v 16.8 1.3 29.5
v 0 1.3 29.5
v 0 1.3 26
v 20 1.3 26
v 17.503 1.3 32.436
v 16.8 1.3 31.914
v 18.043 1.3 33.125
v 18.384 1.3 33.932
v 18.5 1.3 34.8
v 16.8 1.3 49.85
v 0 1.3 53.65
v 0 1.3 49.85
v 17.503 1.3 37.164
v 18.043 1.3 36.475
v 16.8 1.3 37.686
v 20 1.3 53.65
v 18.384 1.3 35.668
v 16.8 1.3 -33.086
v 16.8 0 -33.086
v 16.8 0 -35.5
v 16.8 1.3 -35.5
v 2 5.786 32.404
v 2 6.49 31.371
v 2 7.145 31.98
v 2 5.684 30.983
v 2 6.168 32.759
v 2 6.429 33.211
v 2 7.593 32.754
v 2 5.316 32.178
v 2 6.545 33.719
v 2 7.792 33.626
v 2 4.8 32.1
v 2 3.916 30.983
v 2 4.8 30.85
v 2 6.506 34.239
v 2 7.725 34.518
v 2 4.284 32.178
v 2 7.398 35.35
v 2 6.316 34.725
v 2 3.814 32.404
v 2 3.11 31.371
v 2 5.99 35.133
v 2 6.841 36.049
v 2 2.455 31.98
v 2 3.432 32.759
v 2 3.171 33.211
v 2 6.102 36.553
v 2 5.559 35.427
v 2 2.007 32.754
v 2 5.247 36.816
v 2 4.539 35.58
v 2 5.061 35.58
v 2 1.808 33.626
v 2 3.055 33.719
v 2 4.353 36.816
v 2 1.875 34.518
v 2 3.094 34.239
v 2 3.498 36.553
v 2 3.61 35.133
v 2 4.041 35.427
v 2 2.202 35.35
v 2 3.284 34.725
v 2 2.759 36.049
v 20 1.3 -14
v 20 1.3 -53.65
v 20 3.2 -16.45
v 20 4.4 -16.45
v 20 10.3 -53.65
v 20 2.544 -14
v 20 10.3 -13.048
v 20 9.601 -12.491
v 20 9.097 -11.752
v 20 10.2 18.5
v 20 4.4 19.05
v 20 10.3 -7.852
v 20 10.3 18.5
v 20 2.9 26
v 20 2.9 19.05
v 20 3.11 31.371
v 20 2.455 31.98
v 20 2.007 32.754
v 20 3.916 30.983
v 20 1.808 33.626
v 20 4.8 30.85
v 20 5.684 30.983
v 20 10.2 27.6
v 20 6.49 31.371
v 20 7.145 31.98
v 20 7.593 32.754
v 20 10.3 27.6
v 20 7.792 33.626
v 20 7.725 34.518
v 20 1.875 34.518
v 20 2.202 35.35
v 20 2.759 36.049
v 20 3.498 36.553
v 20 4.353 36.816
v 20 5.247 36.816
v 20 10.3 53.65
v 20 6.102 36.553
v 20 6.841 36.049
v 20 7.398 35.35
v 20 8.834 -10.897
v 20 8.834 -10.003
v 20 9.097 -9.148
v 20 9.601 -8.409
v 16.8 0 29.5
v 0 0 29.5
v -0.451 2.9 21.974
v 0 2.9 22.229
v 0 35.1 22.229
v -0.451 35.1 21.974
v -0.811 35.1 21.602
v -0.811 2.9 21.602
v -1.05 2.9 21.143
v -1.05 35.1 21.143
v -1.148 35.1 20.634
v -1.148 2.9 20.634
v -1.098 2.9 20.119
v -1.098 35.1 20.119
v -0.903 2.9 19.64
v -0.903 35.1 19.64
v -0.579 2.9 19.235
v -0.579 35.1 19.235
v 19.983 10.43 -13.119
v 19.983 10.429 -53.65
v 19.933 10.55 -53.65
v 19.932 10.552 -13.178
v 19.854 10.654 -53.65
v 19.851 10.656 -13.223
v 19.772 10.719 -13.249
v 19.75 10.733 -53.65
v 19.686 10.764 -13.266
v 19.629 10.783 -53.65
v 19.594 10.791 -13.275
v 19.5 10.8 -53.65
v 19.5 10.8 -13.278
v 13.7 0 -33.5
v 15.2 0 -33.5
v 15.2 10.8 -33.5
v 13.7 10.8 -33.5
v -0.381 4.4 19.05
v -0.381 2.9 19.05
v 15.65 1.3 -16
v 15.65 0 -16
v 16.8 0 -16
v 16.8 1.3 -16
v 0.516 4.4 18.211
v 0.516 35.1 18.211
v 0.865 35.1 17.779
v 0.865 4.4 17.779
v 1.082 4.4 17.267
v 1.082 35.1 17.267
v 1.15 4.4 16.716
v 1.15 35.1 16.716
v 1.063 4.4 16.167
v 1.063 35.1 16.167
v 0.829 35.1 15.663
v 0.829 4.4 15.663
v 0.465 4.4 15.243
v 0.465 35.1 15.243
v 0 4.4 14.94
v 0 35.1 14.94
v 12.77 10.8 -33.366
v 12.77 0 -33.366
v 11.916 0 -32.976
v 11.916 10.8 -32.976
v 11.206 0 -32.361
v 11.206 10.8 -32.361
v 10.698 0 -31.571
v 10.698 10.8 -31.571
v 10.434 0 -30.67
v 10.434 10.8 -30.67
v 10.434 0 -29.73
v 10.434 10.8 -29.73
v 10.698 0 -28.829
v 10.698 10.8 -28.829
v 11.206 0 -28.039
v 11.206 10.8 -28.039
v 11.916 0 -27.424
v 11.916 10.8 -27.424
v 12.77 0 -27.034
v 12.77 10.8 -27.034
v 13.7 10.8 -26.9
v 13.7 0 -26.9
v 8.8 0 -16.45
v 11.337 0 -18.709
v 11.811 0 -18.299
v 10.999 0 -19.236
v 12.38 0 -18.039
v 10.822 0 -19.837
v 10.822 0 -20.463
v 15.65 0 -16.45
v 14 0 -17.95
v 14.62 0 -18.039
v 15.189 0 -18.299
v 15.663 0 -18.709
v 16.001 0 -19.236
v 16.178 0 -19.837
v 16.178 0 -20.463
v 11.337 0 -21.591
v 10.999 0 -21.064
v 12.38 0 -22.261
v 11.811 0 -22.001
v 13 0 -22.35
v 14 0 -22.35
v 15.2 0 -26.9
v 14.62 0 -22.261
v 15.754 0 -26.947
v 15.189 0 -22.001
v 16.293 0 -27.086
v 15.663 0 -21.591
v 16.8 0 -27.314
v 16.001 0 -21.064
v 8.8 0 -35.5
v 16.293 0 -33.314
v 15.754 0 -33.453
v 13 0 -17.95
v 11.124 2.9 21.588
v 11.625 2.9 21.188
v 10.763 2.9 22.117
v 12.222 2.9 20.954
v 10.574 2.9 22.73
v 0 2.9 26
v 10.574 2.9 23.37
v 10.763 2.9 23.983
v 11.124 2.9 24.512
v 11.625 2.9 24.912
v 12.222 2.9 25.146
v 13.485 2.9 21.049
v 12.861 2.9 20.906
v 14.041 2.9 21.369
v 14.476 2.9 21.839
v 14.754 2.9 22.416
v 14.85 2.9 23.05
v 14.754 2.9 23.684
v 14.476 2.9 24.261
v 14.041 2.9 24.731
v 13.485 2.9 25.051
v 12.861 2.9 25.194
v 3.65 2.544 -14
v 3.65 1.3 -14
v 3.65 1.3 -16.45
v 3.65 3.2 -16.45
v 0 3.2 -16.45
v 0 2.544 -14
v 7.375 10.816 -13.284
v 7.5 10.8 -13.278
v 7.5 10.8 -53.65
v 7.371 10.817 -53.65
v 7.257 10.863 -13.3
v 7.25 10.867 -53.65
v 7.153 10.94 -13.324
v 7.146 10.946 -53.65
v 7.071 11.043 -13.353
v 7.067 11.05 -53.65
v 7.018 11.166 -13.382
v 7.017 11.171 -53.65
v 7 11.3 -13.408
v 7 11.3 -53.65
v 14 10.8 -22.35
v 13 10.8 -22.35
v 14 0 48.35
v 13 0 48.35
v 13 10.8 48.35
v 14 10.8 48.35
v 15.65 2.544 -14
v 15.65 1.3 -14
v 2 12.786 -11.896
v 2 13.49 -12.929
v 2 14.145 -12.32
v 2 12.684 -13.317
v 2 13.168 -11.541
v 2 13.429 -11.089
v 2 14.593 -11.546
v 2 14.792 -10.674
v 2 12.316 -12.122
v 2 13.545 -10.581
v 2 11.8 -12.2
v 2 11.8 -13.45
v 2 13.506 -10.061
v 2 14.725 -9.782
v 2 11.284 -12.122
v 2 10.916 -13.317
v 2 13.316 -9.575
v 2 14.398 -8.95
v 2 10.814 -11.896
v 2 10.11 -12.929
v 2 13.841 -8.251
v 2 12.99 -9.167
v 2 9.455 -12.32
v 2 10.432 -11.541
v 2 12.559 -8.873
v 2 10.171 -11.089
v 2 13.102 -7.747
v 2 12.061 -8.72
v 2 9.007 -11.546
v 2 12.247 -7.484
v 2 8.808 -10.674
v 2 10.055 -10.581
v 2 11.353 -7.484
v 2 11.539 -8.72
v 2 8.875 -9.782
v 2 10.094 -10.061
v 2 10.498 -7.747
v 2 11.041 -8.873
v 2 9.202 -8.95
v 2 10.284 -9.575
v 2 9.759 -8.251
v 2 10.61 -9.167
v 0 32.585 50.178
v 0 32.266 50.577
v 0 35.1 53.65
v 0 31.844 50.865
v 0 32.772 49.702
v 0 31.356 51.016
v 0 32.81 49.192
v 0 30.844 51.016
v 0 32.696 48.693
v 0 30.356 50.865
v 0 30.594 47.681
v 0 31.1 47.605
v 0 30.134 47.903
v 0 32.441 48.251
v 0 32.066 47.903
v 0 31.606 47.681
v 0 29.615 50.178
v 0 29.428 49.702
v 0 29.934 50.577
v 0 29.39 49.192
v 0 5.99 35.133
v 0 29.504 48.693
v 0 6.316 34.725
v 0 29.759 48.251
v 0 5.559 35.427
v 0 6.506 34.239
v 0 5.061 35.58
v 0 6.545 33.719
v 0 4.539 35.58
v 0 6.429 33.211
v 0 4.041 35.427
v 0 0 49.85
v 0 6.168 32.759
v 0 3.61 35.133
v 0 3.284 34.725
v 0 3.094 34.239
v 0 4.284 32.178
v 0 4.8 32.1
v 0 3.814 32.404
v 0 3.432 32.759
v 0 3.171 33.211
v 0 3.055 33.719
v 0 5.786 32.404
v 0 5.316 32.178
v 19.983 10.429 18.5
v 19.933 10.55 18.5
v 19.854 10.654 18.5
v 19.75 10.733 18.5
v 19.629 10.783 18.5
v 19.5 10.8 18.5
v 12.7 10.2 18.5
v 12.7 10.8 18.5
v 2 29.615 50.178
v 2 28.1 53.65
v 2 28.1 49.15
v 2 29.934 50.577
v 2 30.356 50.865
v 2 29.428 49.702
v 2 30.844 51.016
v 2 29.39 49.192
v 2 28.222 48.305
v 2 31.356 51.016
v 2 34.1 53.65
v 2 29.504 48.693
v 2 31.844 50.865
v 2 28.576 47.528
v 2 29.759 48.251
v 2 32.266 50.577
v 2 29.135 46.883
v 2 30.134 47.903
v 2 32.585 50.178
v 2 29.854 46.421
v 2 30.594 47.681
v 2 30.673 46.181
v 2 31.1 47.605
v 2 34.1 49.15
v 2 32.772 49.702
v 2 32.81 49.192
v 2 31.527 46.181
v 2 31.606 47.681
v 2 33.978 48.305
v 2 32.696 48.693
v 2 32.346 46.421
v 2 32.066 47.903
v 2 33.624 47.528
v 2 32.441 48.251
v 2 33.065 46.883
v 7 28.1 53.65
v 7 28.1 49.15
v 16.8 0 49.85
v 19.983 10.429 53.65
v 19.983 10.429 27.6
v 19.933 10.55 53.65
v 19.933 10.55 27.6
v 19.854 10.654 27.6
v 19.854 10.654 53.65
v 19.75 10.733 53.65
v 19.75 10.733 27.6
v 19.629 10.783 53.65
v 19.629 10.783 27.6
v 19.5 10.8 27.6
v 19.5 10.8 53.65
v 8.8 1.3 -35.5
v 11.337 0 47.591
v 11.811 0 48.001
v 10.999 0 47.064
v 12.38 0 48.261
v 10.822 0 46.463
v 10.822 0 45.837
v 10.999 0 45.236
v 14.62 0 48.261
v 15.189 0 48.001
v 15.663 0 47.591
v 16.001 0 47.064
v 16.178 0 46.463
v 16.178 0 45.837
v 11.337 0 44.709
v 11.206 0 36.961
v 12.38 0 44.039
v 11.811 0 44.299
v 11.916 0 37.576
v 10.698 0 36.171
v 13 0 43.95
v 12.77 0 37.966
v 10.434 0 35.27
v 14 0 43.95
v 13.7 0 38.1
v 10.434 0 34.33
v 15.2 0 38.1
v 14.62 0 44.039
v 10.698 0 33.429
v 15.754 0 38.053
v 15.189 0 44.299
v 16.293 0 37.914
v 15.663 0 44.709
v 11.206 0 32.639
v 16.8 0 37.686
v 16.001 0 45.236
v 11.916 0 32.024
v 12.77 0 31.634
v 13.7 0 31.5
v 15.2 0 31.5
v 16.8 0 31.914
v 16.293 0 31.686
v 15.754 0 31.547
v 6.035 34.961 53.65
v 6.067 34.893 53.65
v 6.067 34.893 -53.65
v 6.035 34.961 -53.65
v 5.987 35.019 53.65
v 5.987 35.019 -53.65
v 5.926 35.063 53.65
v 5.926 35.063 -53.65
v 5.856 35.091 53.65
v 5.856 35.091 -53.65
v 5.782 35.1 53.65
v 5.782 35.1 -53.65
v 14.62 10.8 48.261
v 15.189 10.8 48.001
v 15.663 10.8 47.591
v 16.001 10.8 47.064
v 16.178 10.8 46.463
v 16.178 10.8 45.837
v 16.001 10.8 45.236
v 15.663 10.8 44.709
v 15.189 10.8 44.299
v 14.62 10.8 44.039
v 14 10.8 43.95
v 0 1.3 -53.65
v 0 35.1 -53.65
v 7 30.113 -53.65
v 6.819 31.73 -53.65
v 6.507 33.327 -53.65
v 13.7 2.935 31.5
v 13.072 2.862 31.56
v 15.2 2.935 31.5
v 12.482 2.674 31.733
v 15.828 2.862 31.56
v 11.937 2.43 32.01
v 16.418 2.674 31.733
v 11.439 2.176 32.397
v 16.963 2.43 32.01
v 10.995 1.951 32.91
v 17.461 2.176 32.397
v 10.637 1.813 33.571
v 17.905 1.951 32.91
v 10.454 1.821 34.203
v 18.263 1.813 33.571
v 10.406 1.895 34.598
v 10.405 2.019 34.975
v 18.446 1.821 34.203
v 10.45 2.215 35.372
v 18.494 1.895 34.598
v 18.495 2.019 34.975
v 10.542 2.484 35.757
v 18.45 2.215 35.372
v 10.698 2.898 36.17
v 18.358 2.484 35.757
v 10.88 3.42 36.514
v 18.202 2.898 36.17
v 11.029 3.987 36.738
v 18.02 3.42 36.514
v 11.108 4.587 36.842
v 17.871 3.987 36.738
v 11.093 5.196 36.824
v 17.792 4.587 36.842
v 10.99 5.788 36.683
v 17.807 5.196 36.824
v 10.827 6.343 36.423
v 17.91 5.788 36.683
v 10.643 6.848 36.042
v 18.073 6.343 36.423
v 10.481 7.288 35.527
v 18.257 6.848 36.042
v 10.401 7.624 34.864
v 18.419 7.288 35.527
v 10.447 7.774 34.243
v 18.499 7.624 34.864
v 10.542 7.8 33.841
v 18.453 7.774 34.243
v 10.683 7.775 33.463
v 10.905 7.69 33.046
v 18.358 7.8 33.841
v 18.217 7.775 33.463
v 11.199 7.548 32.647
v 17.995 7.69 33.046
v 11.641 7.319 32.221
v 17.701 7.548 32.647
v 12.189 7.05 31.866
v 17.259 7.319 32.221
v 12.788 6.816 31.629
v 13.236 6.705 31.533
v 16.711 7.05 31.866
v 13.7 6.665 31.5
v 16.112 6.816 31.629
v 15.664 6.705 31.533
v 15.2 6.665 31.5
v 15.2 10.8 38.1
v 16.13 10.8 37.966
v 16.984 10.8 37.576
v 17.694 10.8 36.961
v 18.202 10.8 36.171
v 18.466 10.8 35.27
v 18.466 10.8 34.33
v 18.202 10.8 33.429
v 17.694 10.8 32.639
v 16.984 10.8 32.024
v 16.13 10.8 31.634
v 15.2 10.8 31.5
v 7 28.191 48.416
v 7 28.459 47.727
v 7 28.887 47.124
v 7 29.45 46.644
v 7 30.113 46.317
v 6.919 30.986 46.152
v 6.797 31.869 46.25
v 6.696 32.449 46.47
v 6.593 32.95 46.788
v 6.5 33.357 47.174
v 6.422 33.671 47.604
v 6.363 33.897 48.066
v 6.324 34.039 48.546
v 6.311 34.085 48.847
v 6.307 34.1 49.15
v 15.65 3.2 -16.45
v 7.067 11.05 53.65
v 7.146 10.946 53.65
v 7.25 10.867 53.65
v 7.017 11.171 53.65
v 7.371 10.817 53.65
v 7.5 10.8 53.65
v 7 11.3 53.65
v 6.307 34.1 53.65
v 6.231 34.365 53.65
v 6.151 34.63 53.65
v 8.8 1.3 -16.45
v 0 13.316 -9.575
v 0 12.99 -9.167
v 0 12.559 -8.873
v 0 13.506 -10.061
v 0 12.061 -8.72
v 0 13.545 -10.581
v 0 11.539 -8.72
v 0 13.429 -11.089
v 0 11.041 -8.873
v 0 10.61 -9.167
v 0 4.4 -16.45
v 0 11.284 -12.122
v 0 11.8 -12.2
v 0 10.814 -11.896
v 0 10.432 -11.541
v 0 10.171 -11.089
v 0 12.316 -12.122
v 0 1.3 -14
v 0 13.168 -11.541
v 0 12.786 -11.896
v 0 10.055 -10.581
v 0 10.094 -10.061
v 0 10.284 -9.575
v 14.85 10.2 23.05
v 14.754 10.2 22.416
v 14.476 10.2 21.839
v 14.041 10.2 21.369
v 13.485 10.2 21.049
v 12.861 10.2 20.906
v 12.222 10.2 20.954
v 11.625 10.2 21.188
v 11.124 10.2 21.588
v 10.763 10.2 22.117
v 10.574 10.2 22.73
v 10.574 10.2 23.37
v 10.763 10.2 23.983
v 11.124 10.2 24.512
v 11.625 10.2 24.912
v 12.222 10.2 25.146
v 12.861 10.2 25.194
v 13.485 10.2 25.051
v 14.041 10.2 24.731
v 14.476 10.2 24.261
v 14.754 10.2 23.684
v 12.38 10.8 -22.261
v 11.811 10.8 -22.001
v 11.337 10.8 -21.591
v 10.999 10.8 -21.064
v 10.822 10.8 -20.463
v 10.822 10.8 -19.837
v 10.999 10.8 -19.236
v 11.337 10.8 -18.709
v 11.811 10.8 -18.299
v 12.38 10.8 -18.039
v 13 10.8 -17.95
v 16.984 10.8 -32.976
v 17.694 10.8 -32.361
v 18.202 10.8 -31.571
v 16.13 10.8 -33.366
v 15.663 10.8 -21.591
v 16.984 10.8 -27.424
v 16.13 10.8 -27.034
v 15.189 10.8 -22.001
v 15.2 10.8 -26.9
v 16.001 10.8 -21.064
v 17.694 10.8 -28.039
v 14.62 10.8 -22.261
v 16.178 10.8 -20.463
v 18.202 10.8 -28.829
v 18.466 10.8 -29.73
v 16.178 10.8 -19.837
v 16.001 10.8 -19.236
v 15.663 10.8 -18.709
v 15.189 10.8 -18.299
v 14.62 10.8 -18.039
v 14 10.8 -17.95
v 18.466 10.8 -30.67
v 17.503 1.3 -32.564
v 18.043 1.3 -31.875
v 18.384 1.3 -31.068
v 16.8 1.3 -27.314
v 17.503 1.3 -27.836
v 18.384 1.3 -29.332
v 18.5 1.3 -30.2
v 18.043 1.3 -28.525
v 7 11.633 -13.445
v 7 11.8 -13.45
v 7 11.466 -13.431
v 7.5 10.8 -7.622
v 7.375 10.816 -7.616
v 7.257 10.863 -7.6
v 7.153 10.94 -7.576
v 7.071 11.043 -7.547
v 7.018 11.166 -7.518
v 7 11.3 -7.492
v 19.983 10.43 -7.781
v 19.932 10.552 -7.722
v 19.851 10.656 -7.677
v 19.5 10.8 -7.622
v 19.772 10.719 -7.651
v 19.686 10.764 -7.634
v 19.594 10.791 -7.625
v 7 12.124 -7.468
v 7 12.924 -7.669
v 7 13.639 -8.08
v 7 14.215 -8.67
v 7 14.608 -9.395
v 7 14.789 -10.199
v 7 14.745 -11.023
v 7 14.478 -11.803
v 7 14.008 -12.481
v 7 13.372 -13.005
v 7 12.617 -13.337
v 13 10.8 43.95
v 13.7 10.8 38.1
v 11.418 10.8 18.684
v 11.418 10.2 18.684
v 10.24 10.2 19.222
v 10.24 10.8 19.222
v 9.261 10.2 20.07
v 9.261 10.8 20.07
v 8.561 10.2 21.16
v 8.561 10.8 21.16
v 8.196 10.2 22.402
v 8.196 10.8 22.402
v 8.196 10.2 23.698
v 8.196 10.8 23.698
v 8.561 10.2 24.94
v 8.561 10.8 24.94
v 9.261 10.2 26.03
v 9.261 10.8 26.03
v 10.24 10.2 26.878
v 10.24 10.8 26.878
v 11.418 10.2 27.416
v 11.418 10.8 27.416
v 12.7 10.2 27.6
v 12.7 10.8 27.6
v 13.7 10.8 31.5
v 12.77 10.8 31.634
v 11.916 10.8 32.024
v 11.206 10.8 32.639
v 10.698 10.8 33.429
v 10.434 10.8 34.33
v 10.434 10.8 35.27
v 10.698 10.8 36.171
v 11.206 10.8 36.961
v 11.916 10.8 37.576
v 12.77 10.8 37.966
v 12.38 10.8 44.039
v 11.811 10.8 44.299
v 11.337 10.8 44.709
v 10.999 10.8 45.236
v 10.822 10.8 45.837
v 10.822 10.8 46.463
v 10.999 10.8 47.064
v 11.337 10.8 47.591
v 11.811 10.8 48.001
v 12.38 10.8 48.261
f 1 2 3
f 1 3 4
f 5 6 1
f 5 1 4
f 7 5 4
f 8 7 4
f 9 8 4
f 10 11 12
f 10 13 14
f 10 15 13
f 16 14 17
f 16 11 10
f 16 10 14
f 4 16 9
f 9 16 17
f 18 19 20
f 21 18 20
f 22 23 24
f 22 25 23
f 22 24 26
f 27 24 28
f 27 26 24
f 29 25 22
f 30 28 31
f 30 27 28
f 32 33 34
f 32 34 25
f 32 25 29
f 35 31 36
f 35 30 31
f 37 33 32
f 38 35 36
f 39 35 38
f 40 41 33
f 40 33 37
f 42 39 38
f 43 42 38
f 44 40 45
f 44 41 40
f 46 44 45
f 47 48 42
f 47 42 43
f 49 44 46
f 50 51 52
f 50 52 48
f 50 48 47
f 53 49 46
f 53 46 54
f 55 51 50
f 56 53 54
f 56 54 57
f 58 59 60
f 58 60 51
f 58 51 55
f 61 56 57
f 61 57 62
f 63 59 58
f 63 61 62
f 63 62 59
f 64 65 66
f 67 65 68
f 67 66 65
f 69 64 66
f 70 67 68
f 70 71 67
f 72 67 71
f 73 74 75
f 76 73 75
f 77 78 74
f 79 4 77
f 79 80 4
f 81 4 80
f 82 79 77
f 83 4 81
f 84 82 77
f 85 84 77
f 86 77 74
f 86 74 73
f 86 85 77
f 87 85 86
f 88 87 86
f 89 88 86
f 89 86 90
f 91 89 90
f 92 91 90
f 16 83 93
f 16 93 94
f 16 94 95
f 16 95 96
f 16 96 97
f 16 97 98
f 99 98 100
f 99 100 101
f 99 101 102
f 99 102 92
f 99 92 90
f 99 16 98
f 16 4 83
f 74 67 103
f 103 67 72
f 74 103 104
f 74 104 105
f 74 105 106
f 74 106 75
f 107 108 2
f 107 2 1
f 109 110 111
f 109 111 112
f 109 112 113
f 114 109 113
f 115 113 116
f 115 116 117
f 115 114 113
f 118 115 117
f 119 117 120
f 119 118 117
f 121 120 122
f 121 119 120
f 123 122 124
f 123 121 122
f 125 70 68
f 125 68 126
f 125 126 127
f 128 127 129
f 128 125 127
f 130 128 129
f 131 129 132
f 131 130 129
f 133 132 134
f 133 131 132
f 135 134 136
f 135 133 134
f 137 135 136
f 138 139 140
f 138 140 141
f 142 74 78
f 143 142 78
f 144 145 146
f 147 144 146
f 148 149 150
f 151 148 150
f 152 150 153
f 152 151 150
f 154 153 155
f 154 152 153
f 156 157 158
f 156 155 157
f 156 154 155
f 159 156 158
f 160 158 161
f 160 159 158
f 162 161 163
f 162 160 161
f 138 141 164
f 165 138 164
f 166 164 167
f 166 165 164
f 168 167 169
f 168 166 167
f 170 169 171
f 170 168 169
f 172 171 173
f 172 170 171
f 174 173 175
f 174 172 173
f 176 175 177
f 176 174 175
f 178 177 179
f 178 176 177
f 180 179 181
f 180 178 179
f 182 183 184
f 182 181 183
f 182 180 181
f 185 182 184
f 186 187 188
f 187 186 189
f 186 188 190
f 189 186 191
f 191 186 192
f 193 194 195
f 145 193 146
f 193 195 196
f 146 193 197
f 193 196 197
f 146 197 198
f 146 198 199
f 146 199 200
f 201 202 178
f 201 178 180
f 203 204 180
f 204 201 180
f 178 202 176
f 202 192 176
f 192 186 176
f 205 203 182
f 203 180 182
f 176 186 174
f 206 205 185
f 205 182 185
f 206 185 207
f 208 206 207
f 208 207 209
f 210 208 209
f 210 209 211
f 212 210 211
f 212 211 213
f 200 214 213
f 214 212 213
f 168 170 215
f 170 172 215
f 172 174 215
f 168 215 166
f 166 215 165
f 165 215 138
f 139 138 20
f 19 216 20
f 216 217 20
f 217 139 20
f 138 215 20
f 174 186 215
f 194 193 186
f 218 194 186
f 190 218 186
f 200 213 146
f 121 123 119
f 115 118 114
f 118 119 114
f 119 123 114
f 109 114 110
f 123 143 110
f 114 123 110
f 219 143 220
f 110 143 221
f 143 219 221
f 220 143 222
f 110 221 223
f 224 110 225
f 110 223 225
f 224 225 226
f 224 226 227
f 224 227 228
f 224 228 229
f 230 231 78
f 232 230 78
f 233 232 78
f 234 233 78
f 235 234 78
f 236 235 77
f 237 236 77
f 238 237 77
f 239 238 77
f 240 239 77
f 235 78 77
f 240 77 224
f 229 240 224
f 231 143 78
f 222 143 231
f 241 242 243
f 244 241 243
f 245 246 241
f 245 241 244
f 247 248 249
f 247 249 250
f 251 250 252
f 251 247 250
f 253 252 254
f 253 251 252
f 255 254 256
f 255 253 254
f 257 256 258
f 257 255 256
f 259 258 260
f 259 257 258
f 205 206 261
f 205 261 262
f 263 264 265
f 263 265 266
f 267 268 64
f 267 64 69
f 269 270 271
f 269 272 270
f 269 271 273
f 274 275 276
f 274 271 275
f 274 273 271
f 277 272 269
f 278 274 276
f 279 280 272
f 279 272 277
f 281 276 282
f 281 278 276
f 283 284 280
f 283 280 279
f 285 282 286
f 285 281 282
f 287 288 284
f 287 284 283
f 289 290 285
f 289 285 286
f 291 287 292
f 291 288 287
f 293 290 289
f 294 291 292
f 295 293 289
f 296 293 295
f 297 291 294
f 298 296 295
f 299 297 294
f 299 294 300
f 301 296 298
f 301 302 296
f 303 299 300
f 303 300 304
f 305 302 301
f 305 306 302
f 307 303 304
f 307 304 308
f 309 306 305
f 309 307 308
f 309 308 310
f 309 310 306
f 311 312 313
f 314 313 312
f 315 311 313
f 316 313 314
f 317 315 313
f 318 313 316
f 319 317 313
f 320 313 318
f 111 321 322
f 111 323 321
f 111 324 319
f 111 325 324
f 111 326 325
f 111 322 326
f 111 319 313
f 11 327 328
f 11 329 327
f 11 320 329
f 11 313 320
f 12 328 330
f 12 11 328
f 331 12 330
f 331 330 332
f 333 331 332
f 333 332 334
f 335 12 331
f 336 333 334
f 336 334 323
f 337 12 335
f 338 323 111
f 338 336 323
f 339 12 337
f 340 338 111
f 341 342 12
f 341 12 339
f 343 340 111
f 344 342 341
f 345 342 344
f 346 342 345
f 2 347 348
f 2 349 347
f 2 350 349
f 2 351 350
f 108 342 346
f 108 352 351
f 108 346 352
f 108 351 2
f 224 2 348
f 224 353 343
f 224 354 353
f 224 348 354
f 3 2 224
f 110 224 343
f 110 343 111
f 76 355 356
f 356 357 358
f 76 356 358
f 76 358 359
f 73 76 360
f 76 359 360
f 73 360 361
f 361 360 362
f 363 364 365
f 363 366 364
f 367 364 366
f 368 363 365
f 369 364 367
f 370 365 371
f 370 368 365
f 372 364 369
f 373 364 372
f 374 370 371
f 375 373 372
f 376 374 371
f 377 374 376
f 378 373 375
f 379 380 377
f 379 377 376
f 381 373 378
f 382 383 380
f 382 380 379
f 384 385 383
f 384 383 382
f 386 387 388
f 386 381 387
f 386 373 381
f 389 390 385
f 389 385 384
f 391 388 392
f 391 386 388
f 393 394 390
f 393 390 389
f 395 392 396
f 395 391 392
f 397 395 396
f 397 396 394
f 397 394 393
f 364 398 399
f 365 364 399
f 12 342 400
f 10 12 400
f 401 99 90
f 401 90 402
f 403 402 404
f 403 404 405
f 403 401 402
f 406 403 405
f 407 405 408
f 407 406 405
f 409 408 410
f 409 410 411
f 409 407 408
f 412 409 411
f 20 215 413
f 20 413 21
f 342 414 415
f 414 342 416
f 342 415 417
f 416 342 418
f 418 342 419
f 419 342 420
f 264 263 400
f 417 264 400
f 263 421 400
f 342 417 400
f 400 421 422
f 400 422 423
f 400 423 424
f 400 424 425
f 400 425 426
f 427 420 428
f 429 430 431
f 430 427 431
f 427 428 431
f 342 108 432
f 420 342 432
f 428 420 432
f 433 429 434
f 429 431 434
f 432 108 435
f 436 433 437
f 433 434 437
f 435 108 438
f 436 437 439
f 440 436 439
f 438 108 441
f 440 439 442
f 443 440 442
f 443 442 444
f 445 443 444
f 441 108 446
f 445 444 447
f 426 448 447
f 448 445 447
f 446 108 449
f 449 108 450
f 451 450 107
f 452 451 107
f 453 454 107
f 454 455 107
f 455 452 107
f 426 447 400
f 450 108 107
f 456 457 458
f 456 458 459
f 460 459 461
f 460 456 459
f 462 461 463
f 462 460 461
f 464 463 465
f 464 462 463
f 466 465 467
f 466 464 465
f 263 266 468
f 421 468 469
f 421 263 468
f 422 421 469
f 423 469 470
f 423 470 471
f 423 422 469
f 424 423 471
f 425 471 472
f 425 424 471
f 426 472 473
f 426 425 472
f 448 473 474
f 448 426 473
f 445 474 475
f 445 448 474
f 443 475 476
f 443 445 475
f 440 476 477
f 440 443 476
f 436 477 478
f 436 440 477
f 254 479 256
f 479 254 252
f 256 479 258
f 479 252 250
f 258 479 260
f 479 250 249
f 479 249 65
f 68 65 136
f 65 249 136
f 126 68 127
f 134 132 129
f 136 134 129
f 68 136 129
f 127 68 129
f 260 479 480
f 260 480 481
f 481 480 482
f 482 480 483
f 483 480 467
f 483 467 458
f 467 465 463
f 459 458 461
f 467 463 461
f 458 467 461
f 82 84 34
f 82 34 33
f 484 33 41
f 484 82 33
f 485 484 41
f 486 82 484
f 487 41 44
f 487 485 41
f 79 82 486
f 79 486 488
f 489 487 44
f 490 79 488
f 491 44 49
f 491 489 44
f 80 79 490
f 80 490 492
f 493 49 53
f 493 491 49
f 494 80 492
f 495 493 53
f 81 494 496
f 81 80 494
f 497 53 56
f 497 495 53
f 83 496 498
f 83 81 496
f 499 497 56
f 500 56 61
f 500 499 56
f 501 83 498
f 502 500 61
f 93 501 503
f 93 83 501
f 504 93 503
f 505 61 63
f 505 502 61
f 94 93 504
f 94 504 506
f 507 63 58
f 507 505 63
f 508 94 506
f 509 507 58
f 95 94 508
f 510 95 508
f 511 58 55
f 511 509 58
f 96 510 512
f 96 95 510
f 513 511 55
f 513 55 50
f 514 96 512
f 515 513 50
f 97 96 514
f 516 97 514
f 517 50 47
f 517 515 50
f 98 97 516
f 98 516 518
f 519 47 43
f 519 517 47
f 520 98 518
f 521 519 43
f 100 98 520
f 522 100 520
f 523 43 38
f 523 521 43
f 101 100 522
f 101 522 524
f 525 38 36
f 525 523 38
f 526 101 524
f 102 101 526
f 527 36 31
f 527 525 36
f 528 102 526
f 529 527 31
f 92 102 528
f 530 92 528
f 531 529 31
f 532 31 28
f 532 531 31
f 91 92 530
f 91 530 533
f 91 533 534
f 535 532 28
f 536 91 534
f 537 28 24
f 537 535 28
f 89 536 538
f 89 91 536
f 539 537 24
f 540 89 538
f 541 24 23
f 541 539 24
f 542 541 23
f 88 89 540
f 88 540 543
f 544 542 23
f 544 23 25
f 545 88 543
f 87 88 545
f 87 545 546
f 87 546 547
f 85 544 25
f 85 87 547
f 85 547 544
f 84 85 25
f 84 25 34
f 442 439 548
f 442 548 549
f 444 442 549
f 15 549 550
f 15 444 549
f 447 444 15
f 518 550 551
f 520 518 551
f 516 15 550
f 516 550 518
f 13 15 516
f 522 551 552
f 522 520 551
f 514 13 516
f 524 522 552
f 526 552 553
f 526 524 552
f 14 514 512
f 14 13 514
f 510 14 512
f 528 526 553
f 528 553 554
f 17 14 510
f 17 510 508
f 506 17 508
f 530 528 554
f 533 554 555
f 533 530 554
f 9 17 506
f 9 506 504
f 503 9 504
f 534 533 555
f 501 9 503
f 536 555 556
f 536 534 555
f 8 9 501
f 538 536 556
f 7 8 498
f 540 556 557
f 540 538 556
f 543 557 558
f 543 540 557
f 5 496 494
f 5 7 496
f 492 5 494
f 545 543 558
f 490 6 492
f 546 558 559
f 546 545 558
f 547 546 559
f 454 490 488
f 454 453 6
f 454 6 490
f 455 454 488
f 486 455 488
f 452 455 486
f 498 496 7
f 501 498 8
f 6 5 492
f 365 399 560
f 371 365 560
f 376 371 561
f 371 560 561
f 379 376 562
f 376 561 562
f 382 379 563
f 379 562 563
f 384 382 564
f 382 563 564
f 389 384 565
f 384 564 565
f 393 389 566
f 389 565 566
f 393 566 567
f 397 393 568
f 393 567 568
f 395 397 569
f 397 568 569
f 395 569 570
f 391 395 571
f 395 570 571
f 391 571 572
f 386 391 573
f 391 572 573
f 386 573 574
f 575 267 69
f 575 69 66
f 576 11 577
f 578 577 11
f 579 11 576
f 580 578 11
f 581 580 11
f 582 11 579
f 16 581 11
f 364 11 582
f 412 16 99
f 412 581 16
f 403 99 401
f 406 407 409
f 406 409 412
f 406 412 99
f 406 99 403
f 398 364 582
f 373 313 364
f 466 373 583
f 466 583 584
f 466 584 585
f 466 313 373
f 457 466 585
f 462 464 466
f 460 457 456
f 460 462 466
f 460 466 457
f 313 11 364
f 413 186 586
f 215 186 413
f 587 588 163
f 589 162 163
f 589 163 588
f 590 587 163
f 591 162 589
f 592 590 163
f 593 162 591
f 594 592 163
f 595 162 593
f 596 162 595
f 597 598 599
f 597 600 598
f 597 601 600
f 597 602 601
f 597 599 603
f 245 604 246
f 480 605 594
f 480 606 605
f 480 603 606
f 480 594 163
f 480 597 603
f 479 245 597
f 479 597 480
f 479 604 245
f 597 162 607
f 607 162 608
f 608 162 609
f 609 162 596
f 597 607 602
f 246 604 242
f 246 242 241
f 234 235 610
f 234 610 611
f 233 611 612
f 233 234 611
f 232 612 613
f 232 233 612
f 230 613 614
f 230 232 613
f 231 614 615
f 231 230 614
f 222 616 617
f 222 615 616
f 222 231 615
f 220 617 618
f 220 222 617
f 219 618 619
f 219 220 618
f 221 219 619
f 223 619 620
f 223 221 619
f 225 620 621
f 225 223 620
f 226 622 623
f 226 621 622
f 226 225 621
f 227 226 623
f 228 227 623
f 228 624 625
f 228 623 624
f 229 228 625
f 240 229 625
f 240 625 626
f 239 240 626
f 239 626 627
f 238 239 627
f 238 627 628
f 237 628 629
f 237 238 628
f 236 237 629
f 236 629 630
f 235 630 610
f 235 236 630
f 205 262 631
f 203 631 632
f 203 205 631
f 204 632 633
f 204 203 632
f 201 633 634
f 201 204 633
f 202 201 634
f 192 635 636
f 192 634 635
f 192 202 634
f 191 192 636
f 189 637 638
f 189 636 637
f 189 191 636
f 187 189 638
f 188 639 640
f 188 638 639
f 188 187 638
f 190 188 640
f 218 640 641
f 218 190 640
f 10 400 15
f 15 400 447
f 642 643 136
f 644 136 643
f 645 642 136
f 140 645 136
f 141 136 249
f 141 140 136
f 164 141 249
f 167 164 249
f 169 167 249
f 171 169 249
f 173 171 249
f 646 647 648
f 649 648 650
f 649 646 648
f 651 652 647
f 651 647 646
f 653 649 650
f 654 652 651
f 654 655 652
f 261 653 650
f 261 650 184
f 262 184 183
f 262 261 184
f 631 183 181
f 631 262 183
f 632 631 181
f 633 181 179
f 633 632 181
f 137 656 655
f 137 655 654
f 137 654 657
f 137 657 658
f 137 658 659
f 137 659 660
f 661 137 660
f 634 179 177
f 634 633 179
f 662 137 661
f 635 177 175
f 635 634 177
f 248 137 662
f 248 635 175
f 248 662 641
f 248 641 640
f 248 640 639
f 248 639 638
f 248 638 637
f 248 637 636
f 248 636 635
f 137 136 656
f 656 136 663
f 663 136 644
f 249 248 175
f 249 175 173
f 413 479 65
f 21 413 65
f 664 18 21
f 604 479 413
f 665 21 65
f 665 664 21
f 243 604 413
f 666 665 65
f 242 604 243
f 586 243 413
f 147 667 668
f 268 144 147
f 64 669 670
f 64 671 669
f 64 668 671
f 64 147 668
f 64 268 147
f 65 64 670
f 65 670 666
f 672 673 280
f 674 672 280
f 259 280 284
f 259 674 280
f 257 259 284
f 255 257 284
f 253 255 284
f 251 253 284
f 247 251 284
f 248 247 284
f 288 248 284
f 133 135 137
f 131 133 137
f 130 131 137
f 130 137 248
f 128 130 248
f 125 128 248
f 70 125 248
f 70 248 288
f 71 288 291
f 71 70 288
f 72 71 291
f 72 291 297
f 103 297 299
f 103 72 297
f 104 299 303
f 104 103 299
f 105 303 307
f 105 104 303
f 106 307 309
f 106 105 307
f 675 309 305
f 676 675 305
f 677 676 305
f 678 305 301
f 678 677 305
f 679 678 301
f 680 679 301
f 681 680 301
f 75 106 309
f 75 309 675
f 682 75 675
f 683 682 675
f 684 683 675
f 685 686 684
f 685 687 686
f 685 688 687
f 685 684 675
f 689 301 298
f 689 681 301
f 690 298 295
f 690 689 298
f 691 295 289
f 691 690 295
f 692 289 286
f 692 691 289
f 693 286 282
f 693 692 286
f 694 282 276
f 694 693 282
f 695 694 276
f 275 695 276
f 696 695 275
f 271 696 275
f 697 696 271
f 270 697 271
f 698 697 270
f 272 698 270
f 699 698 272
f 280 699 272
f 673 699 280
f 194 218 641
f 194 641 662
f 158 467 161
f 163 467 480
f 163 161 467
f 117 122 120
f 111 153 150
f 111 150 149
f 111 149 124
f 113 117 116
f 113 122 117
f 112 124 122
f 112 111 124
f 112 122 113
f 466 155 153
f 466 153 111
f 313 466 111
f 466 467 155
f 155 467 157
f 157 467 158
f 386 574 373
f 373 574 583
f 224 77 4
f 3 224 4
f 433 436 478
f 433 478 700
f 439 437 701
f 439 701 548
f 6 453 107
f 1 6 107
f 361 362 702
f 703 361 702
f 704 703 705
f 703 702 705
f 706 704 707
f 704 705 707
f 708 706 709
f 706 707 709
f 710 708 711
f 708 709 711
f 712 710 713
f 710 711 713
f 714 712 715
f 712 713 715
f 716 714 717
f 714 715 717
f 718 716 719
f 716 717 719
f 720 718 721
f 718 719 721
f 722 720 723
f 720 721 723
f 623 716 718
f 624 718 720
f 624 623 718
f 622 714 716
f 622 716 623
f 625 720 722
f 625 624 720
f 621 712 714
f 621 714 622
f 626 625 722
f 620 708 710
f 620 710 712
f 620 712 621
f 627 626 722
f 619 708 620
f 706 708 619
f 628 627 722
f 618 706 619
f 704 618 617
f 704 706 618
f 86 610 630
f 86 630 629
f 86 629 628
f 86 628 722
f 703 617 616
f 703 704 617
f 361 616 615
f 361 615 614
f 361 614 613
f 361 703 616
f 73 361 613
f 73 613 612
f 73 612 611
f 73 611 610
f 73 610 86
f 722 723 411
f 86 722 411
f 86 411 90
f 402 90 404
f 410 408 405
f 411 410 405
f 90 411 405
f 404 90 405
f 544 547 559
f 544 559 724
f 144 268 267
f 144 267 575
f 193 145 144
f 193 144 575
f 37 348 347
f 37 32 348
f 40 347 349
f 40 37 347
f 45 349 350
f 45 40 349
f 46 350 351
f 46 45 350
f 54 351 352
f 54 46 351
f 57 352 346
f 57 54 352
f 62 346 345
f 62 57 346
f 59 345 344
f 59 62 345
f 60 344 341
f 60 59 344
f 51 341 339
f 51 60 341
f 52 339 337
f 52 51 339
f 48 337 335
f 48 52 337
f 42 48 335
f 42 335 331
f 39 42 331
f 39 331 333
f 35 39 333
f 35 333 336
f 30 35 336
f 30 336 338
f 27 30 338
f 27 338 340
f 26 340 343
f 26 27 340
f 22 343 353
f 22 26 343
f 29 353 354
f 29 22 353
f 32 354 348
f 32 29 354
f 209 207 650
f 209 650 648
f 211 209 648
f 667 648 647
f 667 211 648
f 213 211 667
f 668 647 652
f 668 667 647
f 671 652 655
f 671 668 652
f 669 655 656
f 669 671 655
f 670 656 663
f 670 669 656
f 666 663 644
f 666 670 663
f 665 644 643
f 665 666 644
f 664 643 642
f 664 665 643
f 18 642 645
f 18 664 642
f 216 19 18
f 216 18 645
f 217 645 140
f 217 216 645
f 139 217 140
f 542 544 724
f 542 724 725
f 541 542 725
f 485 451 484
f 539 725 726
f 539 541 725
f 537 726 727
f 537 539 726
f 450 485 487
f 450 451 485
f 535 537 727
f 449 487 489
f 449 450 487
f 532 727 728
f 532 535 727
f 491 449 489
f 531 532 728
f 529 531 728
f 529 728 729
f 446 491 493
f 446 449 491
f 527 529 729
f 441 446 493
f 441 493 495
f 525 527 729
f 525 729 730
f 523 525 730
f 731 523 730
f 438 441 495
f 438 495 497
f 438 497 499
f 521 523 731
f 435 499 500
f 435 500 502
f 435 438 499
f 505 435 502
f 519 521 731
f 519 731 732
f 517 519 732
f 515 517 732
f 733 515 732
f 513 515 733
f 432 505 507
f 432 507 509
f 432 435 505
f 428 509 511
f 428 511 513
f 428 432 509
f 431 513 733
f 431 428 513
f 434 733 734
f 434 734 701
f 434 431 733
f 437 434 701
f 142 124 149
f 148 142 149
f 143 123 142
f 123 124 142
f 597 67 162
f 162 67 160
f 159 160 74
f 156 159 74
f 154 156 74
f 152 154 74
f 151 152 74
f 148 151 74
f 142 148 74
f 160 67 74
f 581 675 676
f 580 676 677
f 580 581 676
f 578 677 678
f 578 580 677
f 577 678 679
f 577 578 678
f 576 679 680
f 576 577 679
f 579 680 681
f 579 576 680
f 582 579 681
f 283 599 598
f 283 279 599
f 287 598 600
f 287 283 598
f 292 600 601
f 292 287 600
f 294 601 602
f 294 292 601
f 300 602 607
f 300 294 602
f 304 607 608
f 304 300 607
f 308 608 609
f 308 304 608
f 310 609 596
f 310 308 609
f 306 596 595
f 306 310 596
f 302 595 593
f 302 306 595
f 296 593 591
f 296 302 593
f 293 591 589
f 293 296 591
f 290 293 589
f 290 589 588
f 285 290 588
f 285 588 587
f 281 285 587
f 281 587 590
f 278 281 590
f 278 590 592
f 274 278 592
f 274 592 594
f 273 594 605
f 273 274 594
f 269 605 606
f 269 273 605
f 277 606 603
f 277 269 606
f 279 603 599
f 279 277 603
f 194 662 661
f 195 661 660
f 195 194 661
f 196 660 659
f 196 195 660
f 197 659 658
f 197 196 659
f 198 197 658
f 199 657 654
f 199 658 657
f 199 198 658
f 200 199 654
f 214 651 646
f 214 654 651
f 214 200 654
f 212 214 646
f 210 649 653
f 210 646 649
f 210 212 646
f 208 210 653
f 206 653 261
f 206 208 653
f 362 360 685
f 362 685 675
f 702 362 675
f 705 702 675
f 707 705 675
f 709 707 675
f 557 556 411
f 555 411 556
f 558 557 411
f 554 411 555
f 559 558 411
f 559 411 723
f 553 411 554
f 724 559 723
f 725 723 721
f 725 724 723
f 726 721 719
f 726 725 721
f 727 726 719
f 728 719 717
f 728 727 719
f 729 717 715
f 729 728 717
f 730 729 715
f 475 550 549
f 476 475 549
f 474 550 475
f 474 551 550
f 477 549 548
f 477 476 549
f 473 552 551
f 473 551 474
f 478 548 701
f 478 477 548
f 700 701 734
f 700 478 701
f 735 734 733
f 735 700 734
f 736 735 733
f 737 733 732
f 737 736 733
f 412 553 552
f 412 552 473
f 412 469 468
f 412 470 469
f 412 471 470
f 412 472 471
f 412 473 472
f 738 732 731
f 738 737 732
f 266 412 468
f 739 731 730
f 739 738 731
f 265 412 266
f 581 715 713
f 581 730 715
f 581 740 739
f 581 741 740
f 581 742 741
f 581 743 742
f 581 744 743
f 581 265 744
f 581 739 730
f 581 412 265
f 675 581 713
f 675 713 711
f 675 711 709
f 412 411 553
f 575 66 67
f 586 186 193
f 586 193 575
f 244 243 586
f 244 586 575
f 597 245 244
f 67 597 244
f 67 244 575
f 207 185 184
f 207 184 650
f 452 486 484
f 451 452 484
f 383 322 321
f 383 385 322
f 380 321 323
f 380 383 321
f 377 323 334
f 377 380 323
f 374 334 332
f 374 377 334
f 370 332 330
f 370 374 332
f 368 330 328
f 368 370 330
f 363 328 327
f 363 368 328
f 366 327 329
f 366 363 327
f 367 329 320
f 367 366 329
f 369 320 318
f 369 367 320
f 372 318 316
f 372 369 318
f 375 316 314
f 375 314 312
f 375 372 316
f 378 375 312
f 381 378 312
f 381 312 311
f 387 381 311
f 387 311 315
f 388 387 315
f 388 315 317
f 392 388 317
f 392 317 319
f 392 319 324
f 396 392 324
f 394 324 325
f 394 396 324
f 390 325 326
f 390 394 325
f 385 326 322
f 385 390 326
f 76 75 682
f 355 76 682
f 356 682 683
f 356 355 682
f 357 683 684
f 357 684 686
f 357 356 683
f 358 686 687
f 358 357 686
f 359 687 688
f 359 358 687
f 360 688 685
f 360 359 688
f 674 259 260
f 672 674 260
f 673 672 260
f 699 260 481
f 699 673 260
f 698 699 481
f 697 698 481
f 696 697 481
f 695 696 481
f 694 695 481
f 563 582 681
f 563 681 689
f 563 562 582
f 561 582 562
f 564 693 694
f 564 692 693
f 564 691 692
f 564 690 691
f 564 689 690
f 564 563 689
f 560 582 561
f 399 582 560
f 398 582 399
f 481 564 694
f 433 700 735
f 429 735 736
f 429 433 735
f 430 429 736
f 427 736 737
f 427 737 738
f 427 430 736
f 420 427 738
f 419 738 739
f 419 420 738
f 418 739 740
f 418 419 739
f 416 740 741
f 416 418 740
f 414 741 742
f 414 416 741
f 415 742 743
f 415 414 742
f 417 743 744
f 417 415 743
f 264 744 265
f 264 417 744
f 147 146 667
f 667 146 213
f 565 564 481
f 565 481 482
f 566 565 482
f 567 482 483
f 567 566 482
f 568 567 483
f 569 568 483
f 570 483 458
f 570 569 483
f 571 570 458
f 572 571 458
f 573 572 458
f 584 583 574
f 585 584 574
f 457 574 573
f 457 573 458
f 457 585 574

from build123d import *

# Parameters (mm, degrees)
BOSS_EXTRUDE1_DEPTH      = 53.65
BOSS_EXTRUDE1_DEPTH_BACK = 53.65
CUT_EXTRUDE1_DEPTH       = 50
CUT_EXTRUDE2_DEPTH       = 40
CUT_EXTRUDE2_DEPTH_BACK  = 40
SKETCH4_W                = 8
SKETCH4_H                = 19.5
BOSS_EXTRUDE2_DEPTH      = 1.5
SKETCH5_W                = 16.8
SKETCH5_H                = 20.35
BOSS_EXTRUDE3_DEPTH      = 1.5
CUT_EXTRUDE3_DEPTH       = 30
CUT_EXTRUDE3_DEPTH_BACK  = 30
CUT_EXTRUDE4_DEPTH       = 30
SKETCH8_R                = 2.15
CUT_EXTRUDE5_DEPTH       = 30
CUT_EXTRUDE6_DEPTH       = 10.8
CUT_EXTRUDE7_DEPTH       = 10.8
SKETCH13_W               = 20
SKETCH13_H               = 1.715
CUT_EXTRUDE8_DEPTH       = 5
CUT_EXTRUDE8_DEPTH_BACK  = 5
CUT_EXTRUDE9_DEPTH       = 0.6
SKETCH16_W               = 12
SKETCH16_H               = 2.5
CUT_EXTRUDE10_DEPTH      = 3.5


with BuildPart() as part:
    # Sketch1 → Boss-Extrude1 (new body, two sides)
    with BuildSketch(Plane.XY) as boss_extrude1_sk:
        with BuildLine():
            Line((-5, 1.3), (20, 1.3))
            Line((20, 1.3), (20, 10.3))
            ThreePointArc((20, 10.3), (19.853553391, 10.653553391), (19.5, 10.8))
            Line((19.5, 10.8), (7.5, 10.8))
            ThreePointArc((7.5, 10.8), (7.146446609, 10.946446609), (7, 11.3))
            Line((7, 11.3), (7, 30.113329403))
            ThreePointArc((7, 30.113329403), (6.679537553, 32.531612644), (6.067046966, 34.89289308))
            ThreePointArc((6.067046966, 34.89289308), (5.958046762, 35.042763181), (5.781791158, 35.1))
            Line((5.781791158, 35.1), (-5, 35.1))
            Line((-5, 35.1), (-5, 1.3))
        make_face()
    extrude(amount=BOSS_EXTRUDE1_DEPTH)
    extrude(boss_extrude1_sk.sketch, amount=-BOSS_EXTRUDE1_DEPTH_BACK)

    # Sketch2 → Cut-Extrude1 (cut)
    with BuildSketch(Plane(origin=(0, 0, 0), x_dir=(1, 0, 0), z_dir=(0, 1, 0))):
        with BuildLine():
            Line((-50, 53.65), (-50, -53.65))
            Line((-50, -53.65), (0, -53.65))
            Line((0, -53.65), (0, -22.228541033))
            ThreePointArc((0, -22.228541033), (-1.117187677, -20.892122365), (-0.57947873, -19.235320551))
            Line((-0.57947873, -19.235320551), (0.516087478, -18.210754943))
            ThreePointArc((0.516087478, -18.210754943), (1.125563929, -16.438315605), (0, -14.939613301))
            Line((0, -14.939613301), (0, 53.65))
            Line((0, 53.65), (-50, 53.65))
        make_face()
    extrude(amount=CUT_EXTRUDE1_DEPTH, mode=Mode.SUBTRACT)

    # Sketch3 → Cut-Extrude2 (cut, two sides)
    with BuildSketch(Plane(origin=(0, 0, 0), x_dir=(0, 0, -1), z_dir=(1, 0, 0))) as cut_extrude2_sk:
        Polygon((-26, 2.9), (-26, -8.174443219), (14, -7.963716906), (14, 2.543524479), (16.45, 3.2), (16.45, 4.4), (-19.05, 4.4), (-19.05, 2.9), align=None)
    extrude(amount=CUT_EXTRUDE2_DEPTH, mode=Mode.SUBTRACT)
    extrude(cut_extrude2_sk.sketch, amount=-CUT_EXTRUDE2_DEPTH_BACK, mode=Mode.SUBTRACT)

    # Sketch4 → Boss-Extrude2 (add)
    with BuildSketch(Plane(origin=(0, 0, 0), x_dir=(1, 0, 0), z_dir=(0, 1, 0))):
        with Locations((12.8, 25.75)):
            Rectangle(SKETCH4_W, SKETCH4_H)
    extrude(amount=BOSS_EXTRUDE2_DEPTH)

    # Sketch5 → Boss-Extrude3 (add)
    with BuildSketch(Plane(origin=(0, 0, 0), x_dir=(1, 0, 0), z_dir=(0, 1, 0))):
        with Locations((8.4, -39.675)):
            Rectangle(SKETCH5_W, SKETCH5_H)
    extrude(amount=BOSS_EXTRUDE3_DEPTH)

    # Sketch6 → Cut-Extrude3 (cut, two sides)
    with BuildSketch(Plane(origin=(0, 0, 0), x_dir=(1, 0, 0), z_dir=(0, 1, 0))) as cut_extrude3_sk:
        with BuildLine():
            Line((13.7, 26.9), (15.2, 26.9))
            ThreePointArc((15.2, 26.9), (18.5, 30.2), (15.2, 33.5))
            Line((15.2, 33.5), (13.7, 33.5))
            ThreePointArc((13.7, 33.5), (10.4, 30.2), (13.7, 26.9))
        make_face()
    extrude(amount=CUT_EXTRUDE3_DEPTH, mode=Mode.SUBTRACT)
    extrude(cut_extrude3_sk.sketch, amount=-CUT_EXTRUDE3_DEPTH_BACK, mode=Mode.SUBTRACT)

    # Sketch7 → Cut-Extrude4 (cut)
    with BuildSketch(Plane(origin=(0, 0, 0), x_dir=(1, 0, 0), z_dir=(0, 1, 0))):
        with BuildLine():
            Line((13, 17.95), (14, 17.95))
            ThreePointArc((14, 17.95), (16.2, 20.15), (14, 22.35))
            Line((14, 22.35), (13, 22.35))
            ThreePointArc((13, 22.35), (10.8, 20.15), (13, 17.95))
        make_face()
    extrude(amount=CUT_EXTRUDE4_DEPTH, mode=Mode.SUBTRACT)

    # Sketch8 → Cut-Extrude5 (cut)
    with BuildSketch(Plane(origin=(0, 0, 0), x_dir=(1, 0, 0), z_dir=(0, 1, 0))):
        with Locations((12.7, -23.05)):
            Circle(SKETCH8_R)
    extrude(amount=CUT_EXTRUDE5_DEPTH, mode=Mode.SUBTRACT)

    # Sketch9 → Cut-Extrude6 (cut)
    with BuildSketch(Plane(origin=(0, 0, 0), x_dir=(1, 0, 0), z_dir=(0, 1, 0))):
        with BuildLine():
            Line((13.7, -38.1), (15.2, -38.1))
            ThreePointArc((15.2, -38.1), (18.5, -34.8), (15.2, -31.5))
            Line((15.2, -31.5), (13.7, -31.5))
            ThreePointArc((13.7, -31.5), (10.4, -34.8), (13.7, -38.1))
        make_face()
    extrude(amount=CUT_EXTRUDE6_DEPTH, mode=Mode.SUBTRACT)

    # Sketch10 → Cut-Extrude7 (cut)
    with BuildSketch(Plane(origin=(0, 0, 0), x_dir=(1, 0, 0), z_dir=(0, 1, 0))):
        with BuildLine():
            Line((13, -48.35), (14, -48.35))
            ThreePointArc((14, -48.35), (16.2, -46.15), (14, -43.95))
            Line((14, -43.95), (13, -43.95))
            ThreePointArc((13, -43.95), (10.8, -46.15), (13, -48.35))
        make_face()
    extrude(amount=CUT_EXTRUDE7_DEPTH, mode=Mode.SUBTRACT)

    # Sketch11 → Cut-Revolve1 (revolve, cut)
    with BuildSketch(Plane(origin=(0, 11.8, 0), x_dir=(1, 0, 0), z_dir=(0, 1, 0))):
        Polygon((0, 10.45), (0, 12.2), (2, 12.2), (2, 13.45), (20, 13.45), (20, 10.45), align=None)
    revolve(axis=Axis((20, 11.8, -10.45), (-1, 0, 0)), mode=Mode.SUBTRACT)

    # Sketch12 → Cut-Revolve2 (revolve, cut)
    with BuildSketch(Plane(origin=(0, 4.8, 0), x_dir=(1, 0, 0), z_dir=(0, 1, 0))):
        Polygon((0, -33.85), (0, -32.1), (2, -32.1), (2, -30.85), (20, -30.85), (20, -33.85), align=None)
    revolve(axis=Axis((20, 4.8, 33.85), (-1, 0, 0)), mode=Mode.SUBTRACT)

    # Sketch13 → Cut-Revolve3 (revolve, cut)
    with BuildSketch(Plane(origin=(0, 31.1, 0), x_dir=(1, 0, 0), z_dir=(0, 1, 0))):
        with Locations((10, -48.4625)):
            Rectangle(SKETCH13_W, SKETCH13_H)
    revolve(axis=Axis((20, 31.1, 49.32), (-1, 0, 0)), mode=Mode.SUBTRACT)

    # Sketch14 → Cut-Extrude8 (cut, two sides)
    with BuildSketch(Plane(origin=(7, 0, 0), x_dir=(0, 0, -1), z_dir=(1, 0, 0))) as cut_extrude8_sk:
        with BuildLine():
            Line((-54.15, 28.1), (-49.15, 28.1))
            ThreePointArc((-49.15, 28.1), (-46.15, 31.1), (-49.15, 34.1))
            Line((-49.15, 34.1), (-54.15, 34.1))
            Line((-54.15, 34.1), (-54.15, 28.1))
        make_face()
    extrude(amount=CUT_EXTRUDE8_DEPTH, mode=Mode.SUBTRACT)
    extrude(cut_extrude8_sk.sketch, amount=-CUT_EXTRUDE8_DEPTH_BACK, mode=Mode.SUBTRACT)

    # Sketch15 → Cut-Extrude9 (cut)
    with BuildSketch(Plane(origin=(0, 10.8, 0), x_dir=(1, 0, 0), z_dir=(0, 1, 0))):
        with BuildLine():
            Line((12.7, -27.6), (20, -27.6))
            Line((20, -27.6), (20, -18.5))
            Line((20, -18.5), (12.7, -18.5))
            ThreePointArc((12.7, -18.5), (8.15, -23.05), (12.7, -27.6))
        make_face()
    extrude(amount=-CUT_EXTRUDE9_DEPTH, mode=Mode.SUBTRACT)

    # Sketch16 → Cut-Extrude10 (cut)
    with BuildSketch(Plane(origin=(0, 0, 0), x_dir=(1, 0, 0), z_dir=(0, 1, 0))):
        with Locations((9.65, 15.2)):
            Rectangle(SKETCH16_W, SKETCH16_H)
    extrude(amount=CUT_EXTRUDE10_DEPTH, mode=Mode.SUBTRACT)


solid = part.part
